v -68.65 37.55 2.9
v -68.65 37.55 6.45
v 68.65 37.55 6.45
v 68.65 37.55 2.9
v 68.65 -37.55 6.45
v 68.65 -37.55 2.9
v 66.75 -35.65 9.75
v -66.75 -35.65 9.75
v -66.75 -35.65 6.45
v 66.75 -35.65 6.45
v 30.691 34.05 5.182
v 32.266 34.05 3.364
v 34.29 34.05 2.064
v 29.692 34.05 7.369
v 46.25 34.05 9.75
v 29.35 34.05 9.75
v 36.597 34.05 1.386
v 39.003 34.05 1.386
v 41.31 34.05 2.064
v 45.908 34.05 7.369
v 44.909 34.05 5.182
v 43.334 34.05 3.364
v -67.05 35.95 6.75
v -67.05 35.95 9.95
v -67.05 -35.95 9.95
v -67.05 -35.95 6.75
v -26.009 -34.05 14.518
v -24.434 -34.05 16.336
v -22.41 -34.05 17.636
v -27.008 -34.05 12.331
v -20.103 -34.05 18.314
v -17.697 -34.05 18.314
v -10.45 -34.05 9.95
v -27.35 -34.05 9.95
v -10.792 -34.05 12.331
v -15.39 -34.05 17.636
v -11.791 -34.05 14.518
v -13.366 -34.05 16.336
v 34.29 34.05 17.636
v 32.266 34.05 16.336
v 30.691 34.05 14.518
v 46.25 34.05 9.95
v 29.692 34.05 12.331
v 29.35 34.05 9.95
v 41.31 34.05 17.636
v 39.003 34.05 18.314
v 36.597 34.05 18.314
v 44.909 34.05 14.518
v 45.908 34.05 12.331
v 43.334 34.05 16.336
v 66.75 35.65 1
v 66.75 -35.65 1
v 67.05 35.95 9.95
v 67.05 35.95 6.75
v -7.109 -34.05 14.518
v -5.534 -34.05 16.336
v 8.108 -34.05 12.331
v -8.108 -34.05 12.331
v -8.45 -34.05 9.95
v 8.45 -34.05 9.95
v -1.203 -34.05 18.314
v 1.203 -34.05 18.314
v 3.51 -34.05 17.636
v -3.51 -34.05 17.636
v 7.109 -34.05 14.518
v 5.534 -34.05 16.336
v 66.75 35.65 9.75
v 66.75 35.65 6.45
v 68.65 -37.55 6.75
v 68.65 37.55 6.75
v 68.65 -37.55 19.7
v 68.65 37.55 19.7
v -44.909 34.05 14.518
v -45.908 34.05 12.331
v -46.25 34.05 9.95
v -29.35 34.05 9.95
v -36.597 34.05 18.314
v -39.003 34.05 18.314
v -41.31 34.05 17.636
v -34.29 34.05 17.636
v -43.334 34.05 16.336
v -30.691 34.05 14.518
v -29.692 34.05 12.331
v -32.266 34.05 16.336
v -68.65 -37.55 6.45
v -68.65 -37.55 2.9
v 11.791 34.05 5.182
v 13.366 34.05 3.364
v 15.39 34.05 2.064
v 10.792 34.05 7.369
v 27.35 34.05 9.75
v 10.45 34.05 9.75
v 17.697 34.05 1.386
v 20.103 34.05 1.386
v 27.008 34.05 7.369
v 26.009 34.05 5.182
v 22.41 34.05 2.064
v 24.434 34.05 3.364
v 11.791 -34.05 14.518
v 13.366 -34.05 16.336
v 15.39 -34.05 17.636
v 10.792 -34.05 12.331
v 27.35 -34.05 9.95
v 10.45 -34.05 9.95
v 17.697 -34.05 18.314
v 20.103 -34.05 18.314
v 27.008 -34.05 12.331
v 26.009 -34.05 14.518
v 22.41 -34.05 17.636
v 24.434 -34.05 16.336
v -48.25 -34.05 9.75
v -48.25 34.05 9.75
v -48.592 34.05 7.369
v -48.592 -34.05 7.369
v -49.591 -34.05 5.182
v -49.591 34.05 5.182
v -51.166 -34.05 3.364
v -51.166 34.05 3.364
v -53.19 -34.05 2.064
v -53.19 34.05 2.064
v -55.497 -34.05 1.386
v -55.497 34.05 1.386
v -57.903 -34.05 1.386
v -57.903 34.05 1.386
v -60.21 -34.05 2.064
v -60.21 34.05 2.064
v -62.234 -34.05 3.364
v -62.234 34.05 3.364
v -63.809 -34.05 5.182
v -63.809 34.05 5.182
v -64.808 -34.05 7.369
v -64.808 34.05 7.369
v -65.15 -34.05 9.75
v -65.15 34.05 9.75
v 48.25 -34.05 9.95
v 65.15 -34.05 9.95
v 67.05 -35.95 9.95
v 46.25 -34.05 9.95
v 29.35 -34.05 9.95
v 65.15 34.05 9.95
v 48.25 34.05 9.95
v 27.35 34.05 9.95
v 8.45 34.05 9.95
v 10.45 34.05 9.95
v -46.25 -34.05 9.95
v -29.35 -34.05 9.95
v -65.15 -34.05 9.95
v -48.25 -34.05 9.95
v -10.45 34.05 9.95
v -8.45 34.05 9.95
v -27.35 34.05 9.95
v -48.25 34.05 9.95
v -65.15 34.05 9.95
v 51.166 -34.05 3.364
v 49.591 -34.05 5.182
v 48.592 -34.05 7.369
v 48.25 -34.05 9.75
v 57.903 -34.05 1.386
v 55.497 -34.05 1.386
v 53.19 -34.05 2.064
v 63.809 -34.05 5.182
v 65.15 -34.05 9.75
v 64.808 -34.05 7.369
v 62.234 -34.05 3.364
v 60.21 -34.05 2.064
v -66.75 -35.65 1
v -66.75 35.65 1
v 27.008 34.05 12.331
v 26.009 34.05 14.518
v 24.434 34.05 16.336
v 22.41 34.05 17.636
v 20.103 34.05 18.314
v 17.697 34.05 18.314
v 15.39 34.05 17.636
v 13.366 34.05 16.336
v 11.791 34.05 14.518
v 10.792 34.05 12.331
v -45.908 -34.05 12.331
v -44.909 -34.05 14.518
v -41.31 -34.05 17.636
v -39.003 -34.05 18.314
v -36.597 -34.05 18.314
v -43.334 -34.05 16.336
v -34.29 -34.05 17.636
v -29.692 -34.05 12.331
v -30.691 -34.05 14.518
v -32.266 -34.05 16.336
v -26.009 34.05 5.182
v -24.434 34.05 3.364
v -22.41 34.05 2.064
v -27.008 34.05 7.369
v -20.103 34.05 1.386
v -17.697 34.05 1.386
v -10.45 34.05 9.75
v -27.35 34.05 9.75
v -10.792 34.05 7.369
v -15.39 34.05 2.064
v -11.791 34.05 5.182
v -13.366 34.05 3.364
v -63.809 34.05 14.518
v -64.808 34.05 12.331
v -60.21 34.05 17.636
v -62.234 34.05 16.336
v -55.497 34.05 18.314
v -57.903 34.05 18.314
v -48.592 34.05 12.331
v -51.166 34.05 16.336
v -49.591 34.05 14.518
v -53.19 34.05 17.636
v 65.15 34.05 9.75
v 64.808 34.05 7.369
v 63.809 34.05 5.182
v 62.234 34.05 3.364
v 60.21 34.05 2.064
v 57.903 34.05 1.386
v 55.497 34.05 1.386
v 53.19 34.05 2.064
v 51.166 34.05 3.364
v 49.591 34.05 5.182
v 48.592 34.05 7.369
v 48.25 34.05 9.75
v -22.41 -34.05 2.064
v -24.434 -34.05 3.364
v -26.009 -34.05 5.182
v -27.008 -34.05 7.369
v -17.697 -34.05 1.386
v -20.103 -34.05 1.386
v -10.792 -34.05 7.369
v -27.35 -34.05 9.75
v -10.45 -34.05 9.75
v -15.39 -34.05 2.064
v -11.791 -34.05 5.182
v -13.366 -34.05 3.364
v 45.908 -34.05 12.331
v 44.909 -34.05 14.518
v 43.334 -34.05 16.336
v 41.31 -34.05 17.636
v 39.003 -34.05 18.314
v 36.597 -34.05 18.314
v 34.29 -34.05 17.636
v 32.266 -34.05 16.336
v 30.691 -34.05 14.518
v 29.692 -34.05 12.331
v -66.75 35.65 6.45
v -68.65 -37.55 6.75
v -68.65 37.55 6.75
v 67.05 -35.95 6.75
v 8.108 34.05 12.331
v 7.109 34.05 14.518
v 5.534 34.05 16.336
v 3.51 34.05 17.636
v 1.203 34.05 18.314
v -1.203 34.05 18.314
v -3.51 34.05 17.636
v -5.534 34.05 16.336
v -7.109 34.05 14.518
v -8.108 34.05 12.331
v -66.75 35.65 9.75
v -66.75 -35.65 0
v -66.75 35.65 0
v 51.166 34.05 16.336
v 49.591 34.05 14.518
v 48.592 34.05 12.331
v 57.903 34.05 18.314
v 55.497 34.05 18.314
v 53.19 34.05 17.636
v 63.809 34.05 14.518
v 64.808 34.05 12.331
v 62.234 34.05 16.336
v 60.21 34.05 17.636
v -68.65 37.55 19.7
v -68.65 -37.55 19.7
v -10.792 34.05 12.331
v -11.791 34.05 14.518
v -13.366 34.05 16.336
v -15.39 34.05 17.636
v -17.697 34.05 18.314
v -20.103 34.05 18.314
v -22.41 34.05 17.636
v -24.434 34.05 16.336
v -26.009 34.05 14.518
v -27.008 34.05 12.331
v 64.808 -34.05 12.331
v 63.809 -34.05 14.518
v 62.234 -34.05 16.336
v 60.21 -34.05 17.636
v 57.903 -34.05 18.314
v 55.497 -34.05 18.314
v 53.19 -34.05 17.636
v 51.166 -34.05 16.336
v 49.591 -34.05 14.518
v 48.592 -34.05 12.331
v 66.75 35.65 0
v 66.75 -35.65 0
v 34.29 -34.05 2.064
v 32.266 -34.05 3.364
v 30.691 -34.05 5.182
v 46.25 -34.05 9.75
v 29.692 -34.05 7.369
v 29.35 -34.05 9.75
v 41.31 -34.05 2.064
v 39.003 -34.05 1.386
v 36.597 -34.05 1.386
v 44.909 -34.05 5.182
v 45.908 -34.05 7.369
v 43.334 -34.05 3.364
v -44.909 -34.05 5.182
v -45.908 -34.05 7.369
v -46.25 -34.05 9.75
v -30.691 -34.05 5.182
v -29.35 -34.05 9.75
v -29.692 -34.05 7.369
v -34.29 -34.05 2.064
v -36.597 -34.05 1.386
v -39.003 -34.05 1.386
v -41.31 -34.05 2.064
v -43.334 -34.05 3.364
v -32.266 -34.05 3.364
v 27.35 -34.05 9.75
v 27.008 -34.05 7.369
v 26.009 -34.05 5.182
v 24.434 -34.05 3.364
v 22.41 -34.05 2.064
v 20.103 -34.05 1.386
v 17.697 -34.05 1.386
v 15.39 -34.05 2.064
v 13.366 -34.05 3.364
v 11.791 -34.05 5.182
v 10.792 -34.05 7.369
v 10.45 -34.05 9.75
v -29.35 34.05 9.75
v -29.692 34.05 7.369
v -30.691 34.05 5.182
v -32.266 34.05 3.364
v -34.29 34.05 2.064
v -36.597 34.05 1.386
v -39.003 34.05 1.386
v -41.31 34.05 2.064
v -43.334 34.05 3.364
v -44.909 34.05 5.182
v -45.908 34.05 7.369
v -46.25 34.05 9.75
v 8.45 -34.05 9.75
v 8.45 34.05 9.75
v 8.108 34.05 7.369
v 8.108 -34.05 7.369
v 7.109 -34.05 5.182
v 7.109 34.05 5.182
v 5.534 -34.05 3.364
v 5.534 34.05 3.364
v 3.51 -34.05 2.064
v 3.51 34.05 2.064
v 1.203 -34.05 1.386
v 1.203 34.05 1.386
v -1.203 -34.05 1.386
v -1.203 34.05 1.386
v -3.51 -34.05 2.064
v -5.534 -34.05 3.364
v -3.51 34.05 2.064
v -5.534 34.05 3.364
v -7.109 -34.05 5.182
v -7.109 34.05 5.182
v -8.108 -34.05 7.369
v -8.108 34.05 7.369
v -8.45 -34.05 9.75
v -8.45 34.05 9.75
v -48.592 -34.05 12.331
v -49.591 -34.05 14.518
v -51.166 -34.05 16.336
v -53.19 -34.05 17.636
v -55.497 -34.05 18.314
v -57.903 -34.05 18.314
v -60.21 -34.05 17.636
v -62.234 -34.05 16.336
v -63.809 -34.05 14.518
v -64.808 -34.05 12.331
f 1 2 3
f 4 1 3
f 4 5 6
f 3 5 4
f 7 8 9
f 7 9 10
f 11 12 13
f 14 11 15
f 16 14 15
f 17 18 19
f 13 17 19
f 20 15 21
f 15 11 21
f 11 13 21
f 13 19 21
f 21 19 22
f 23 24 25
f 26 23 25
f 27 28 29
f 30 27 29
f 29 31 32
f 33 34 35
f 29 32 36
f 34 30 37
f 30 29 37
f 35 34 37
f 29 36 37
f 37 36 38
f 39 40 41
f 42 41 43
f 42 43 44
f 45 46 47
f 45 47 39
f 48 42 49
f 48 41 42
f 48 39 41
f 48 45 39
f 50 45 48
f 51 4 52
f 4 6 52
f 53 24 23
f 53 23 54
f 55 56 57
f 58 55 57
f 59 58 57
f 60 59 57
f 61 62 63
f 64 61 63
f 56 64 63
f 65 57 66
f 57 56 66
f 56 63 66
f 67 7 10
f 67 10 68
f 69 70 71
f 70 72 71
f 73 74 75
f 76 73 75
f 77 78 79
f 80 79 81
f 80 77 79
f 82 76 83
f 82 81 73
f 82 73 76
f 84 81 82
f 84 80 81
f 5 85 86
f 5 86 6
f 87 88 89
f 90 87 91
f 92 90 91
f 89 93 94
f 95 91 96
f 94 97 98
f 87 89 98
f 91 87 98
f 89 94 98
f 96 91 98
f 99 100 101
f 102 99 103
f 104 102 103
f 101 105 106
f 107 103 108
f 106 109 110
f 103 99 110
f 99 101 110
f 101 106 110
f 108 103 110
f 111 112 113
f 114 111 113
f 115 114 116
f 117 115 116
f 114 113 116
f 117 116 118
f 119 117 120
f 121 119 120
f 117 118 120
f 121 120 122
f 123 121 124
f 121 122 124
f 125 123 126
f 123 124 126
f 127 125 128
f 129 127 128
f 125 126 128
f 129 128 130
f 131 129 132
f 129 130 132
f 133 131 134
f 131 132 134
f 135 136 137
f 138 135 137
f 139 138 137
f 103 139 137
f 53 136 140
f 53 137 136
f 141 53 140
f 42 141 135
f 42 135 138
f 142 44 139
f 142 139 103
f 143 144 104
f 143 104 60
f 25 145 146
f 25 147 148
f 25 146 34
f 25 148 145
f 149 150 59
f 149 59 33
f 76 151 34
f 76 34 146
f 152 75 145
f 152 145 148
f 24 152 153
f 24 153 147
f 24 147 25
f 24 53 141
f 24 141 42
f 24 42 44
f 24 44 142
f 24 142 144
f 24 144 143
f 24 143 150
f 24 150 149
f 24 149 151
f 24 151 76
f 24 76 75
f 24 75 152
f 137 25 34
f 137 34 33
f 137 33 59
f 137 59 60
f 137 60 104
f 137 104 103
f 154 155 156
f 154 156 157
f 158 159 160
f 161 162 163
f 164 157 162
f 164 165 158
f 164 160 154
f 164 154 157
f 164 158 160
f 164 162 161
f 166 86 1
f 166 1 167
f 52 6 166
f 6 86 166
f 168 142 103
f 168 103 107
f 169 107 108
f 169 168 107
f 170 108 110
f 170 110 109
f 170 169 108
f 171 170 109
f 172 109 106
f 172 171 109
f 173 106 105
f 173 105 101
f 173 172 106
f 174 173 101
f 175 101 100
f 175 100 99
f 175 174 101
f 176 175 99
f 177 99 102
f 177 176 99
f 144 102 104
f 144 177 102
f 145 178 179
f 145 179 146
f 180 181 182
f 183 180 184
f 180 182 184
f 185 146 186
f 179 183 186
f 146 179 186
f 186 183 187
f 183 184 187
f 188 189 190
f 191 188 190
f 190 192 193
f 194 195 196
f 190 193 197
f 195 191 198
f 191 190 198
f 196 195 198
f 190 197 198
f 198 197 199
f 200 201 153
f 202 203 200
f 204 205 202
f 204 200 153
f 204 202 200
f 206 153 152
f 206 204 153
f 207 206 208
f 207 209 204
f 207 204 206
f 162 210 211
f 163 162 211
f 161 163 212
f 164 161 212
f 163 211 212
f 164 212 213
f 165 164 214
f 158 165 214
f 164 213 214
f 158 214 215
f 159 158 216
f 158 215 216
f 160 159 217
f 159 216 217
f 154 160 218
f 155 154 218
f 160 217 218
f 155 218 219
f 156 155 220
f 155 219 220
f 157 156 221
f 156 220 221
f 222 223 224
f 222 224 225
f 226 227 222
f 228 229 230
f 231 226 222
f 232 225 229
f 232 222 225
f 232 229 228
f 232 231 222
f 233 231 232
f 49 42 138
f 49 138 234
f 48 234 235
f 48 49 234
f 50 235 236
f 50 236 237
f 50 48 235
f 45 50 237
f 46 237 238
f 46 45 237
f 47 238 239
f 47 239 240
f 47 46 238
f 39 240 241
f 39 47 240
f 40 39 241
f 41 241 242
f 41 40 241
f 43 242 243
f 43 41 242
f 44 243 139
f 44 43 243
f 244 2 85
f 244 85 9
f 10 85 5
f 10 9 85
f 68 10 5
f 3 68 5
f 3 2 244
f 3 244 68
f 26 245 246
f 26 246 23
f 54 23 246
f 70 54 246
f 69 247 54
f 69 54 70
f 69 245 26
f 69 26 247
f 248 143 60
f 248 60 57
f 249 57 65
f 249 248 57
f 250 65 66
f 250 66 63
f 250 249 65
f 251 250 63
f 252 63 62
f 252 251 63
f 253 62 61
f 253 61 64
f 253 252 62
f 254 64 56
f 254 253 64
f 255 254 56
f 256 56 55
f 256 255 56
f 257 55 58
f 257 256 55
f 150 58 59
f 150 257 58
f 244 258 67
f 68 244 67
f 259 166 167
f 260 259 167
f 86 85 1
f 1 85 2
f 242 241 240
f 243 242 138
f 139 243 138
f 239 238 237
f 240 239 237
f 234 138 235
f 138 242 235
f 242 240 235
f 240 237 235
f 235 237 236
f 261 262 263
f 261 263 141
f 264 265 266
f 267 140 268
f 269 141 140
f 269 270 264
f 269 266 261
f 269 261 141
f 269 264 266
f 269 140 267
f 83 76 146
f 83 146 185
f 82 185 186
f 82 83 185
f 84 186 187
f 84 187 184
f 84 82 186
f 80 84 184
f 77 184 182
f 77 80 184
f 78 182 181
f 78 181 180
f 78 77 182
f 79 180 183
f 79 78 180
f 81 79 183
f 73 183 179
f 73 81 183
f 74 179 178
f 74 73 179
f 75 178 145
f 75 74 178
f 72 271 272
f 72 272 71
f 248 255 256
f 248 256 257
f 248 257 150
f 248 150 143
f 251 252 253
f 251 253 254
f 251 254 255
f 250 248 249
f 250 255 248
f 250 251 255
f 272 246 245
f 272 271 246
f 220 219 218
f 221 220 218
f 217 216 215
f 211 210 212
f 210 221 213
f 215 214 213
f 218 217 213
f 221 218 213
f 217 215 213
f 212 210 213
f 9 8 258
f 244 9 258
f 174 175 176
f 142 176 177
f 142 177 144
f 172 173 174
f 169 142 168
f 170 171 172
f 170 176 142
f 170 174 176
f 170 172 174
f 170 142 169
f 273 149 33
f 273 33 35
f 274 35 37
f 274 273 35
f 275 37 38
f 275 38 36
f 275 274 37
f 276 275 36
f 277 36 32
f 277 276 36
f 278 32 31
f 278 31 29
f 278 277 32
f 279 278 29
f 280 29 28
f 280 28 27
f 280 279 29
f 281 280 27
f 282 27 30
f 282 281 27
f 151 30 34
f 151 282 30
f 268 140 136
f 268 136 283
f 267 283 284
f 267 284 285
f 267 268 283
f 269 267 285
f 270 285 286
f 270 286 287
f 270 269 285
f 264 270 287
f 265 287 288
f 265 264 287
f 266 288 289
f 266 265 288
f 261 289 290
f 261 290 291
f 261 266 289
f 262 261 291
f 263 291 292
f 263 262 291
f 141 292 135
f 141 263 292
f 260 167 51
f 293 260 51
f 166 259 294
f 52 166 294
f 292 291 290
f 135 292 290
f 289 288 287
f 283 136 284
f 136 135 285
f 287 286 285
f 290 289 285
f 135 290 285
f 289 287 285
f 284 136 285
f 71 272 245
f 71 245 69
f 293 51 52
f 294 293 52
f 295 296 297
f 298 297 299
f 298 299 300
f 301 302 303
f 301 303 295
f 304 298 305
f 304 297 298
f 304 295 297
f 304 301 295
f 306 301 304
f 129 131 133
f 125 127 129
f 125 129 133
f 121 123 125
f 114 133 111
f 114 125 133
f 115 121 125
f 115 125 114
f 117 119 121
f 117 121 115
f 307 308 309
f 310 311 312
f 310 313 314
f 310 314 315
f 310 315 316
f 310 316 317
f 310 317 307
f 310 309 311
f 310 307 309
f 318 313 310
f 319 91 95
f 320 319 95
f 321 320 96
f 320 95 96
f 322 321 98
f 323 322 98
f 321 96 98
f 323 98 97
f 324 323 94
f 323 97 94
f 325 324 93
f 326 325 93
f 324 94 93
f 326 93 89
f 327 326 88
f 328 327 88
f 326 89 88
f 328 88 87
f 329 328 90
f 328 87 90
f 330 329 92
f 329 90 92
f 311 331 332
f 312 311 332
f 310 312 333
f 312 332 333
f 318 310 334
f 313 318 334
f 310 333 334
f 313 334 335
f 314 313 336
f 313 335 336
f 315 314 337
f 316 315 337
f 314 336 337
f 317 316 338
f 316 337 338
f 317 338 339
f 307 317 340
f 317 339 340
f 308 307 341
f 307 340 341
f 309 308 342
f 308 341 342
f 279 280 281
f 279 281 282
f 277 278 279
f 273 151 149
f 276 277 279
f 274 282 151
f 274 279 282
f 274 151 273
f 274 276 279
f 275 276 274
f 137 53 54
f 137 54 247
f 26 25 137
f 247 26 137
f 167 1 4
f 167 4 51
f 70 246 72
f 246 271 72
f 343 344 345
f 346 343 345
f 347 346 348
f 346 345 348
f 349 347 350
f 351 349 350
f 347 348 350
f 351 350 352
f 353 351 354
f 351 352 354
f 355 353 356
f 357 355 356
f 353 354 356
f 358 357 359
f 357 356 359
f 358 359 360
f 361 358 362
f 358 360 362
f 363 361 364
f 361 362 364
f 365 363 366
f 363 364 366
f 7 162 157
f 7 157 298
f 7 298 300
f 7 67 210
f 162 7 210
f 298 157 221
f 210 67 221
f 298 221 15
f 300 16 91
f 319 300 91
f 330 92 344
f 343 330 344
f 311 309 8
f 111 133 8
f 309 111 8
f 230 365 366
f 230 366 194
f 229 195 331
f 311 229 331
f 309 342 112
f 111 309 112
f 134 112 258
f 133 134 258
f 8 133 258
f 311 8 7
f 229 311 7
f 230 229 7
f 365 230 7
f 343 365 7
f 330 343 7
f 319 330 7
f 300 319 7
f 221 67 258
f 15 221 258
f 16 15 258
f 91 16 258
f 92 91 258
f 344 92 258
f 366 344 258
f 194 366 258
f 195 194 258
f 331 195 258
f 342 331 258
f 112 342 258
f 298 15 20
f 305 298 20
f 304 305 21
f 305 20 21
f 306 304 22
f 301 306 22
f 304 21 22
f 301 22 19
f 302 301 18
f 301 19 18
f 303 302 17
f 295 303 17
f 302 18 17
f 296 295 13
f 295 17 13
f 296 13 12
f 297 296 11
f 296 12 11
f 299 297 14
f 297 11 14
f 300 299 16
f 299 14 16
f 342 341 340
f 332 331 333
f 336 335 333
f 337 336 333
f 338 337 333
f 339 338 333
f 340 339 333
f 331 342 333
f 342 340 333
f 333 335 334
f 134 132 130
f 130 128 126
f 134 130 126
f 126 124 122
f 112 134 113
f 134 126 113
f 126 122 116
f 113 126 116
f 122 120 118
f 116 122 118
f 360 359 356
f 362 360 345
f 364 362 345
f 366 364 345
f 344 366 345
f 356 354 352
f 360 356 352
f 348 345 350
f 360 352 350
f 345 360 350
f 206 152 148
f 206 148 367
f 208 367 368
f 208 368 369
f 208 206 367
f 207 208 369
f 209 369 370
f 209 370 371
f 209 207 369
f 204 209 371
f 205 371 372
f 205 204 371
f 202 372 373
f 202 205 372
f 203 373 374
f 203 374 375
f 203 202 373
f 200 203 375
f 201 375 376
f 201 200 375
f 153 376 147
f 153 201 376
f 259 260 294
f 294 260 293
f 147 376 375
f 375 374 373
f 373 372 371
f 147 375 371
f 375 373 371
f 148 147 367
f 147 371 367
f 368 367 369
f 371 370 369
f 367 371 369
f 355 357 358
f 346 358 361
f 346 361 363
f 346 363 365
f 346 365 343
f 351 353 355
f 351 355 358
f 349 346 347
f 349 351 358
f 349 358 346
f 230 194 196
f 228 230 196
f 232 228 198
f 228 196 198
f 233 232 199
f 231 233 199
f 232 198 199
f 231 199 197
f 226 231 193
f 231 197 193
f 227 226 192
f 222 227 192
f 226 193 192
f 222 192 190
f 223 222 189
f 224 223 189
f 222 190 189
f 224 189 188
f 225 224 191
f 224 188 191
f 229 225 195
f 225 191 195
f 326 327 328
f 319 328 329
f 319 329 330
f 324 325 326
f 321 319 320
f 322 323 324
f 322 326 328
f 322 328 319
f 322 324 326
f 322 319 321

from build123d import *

# Parameters (mm, degrees)
F4_W          = 137.3
F4_H          = 75.1
F5_DEPTH      = 1
F6_W          = 137.3
F6_H          = 75.1
F6_W_2        = 130.3
F6_H_2        = 68.1
F7_DEPTH      = 8.75
F9_DEPTH      = 68.1
F12_W         = 137.3
F12_H         = 75.1
F12_W_2       = 133.5
F12_H_2       = 71.3
F13_DEPTH     = 3.3
F14_W         = 137.3
F14_H         = 75.1
F14_W_2       = 133.5
F14_H_2       = 71.3
F15_DEPTH     = 3
F16_T4_DEPTH  = 133.5
F16_T9_DEPTH  = 71.3
F16_T14_DEPTH = 133.5
F16_T19_DEPTH = 71.3
F16_T25_DEPTH = 138.6433659759
F16_T31_DEPTH = 76.4433659759
F16_T40_DEPTH = 138.6433659759
F16_T46_DEPTH = 76.4433659759
F16_T55_DEPTH = 138.6433659759
F16_T61_DEPTH = 76.4433659759
F16_T70_DEPTH = 76.4433659759
F16_T76_DEPTH = 138.6433659759
F17_W         = 137.3
F17_H         = 75.1
F17_W_2       = 134.1
F17_H_2       = 71.9
F18_DEPTH     = 3.2


# Not quite as in the source:
# - a fillet or chamfer that OpenCascade refuses, or shapes differently, is made with other operations: its cross-section is extruded or revolved along the edge and cut away or added


with BuildPart() as f5:
    # F4 (on Top) → F5 (new body)
    with BuildSketch(Plane.XY):
        Rectangle(F4_W, F4_H)
    extrude(amount=F5_DEPTH)

    # F6 (on face) → F7 (join)
    with BuildSketch(Plane.XY.offset(1)):
        Rectangle(F6_W, F6_H)
        Rectangle(F6_W_2, F6_H_2, mode=Mode.SUBTRACT)
    extrude(amount=F7_DEPTH)

    # F8 (on face) → F9 (join, through all)
    with BuildSketch(Plane.XZ.offset(-34.05)):
        with BuildLine():
            ThreePointArc((-48.25, 9.75), (-56.7, 1.3), (-65.15, 9.75))
            Line((-65.15, 9.75), (-65.15, 1))
            Line((-65.15, 1), (65.15, 1))
            Line((65.15, 1), (65.15, 9.75))
            ThreePointArc((65.15, 9.75), (56.7, 1.3), (48.25, 9.75))
            Line((48.25, 9.75), (46.25, 9.75))
            ThreePointArc((46.25, 9.75), (37.8, 1.3), (29.35, 9.75))
            Line((29.35, 9.75), (27.35, 9.75))
            ThreePointArc((27.35, 9.75), (18.9, 1.3), (10.45, 9.75))
            Line((10.45, 9.75), (8.45, 9.75))
            ThreePointArc((8.45, 9.75), (0, 1.3), (-8.45, 9.75))
            Line((-8.45, 9.75), (-10.45, 9.75))
            ThreePointArc((-10.45, 9.75), (-18.9, 1.3), (-27.35, 9.75))
            Line((-27.35, 9.75), (-29.35, 9.75))
            ThreePointArc((-29.35, 9.75), (-37.8, 1.3), (-46.25, 9.75))
            Line((-46.25, 9.75), (-48.25, 9.75))
        make_face()
    extrude(amount=F9_DEPTH)


with BuildPart() as f11_1:
    # F11: instance of F5
    add(f5.part.mirror(Plane.XY.offset(9.85)))

    # F17 (on face) → F18 (join)
    with BuildSketch(Plane(origin=(0, 0, 9.95), x_dir=(1, 0, 0), z_dir=(0, 0, -1))):
        Rectangle(F17_W, F17_H)
        Rectangle(F17_W_2, F17_H_2, mode=Mode.SUBTRACT)
    extrude(amount=F18_DEPTH)


with BuildPart() as f5_1:
    add(f5.part)

    # F12 (on face) → F13 (cut)
    with BuildSketch(Plane.XY.offset(9.75)):
        Rectangle(F12_W, F12_H)
        Rectangle(F12_W_2, F12_H_2, mode=Mode.SUBTRACT)
    extrude(amount=-F13_DEPTH, mode=Mode.SUBTRACT)

    # F14 (on face) → F15 (cut)
    with BuildSketch(Plane(origin=(0, 0, 0), x_dir=(1, 0, 0), z_dir=(0, 0, -1))):
        Rectangle(F14_W, F14_H)
        Rectangle(F14_W_2, F14_H_2, mode=Mode.SUBTRACT)
    extrude(amount=-F15_DEPTH, mode=Mode.SUBTRACT)

    # F16: chamfer of 2 on 4 edges, made by hand


with BuildPart() as f16_tool2:
    # F16_s3 → F16_t4 (new body)
    with BuildSketch(Plane.YZ.offset(-66.75)):
        Polygon((-37.65, 3), (-35.65, 1), (-35.65, 3), align=None)
    extrude(amount=F16_T4_DEPTH)

    split(bisect_by=Plane.XZ.offset(37.55), keep=Keep.BOTTOM)


with BuildPart() as f5_2:
    add(f5_1.part)

    # F16_t1: union F16_tool2
    add(f16_tool2.part)


with BuildPart() as f16_tool7:
    # F16_s8 → F16_t9 (new body)
    with BuildSketch(Plane.XZ.offset(-35.65)):
        Polygon((-68.75, 3), (-66.75, 1), (-66.75, 3), align=None)
    extrude(amount=F16_T9_DEPTH)

    split(bisect_by=Plane.YZ.offset(-68.65), keep=Keep.TOP)


with BuildPart() as f5_3:
    add(f5_2.part)

    # F16_t6: union F16_tool7
    add(f16_tool7.part)


with BuildPart() as f16_tool12:
    # F16_s13 → F16_t14 (new body)
    with BuildSketch(Plane.YZ.offset(66.75)):
        Polygon((37.65, 3), (35.65, 1), (35.65, 3), align=None)
    extrude(amount=-F16_T14_DEPTH)

    split(bisect_by=Plane.XZ.offset(-37.55), keep=Keep.TOP)


with BuildPart() as f5_4:
    add(f5_3.part)

    # F16_t11: union F16_tool12
    add(f16_tool12.part)


with BuildPart() as f16_tool17:
    # F16_s18 → F16_t19 (new body)
    with BuildSketch(Plane.XZ.offset(35.65)):
        Polygon((68.75, 3), (66.75, 1), (66.75, 3), align=None)
    extrude(amount=-F16_T19_DEPTH)

    split(bisect_by=Plane.YZ.offset(68.65), keep=Keep.BOTTOM)


with BuildPart() as f5_5:
    add(f5_4.part)

    # F16_t16: union F16_tool17
    add(f16_tool17.part)


with BuildPart() as f16_tool23:
    # F16_s24 → F16_t25 (new body)
    with BuildSketch(Plane.YZ.offset(-71.8933659759)):
        Polygon((-37.65, 3), (-35.65, 1), (-35.65, 3), align=None)
    extrude(amount=F16_T25_DEPTH)

    split(bisect_by=Plane.XZ.offset(37.55), keep=Keep.BOTTOM)

    split(bisect_by=Plane.YZ.offset(-68.65), keep=Keep.TOP)

    split(bisect_by=Plane.YZ.offset(-66.75), keep=Keep.BOTTOM)


with BuildPart() as f16_tool29:
    # F16_s30 → F16_t31 (new body)
    with BuildSketch(Plane.XZ.offset(-35.65)):
        Polygon((-68.75, 3), (-66.75, 1), (-66.75, 3), align=None)
    extrude(amount=F16_T31_DEPTH)

    split(bisect_by=Plane.XZ.offset(37.55), keep=Keep.BOTTOM)

    split(bisect_by=Plane.YZ.offset(-68.65), keep=Keep.TOP)

    split(bisect_by=Plane.XZ.offset(35.65), keep=Keep.TOP)


with BuildPart() as f16_tool23_1:
    add(f16_tool23.part)

    # F16_t35: intersect F16_tool29
    add(f16_tool29.part, mode=Mode.INTERSECT)


with BuildPart() as f5_6:
    add(f5_5.part)

    # F16_t21: union F16_tool23
    add(f16_tool23_1.part)


with BuildPart() as f16_tool38:
    # F16_s39 → F16_t40 (new body)
    with BuildSketch(Plane.YZ.offset(-66.75)):
        Polygon((-37.65, 3), (-35.65, 1), (-35.65, 3), align=None)
    extrude(amount=F16_T40_DEPTH)

    split(bisect_by=Plane.XZ.offset(37.55), keep=Keep.BOTTOM)

    split(bisect_by=Plane.YZ.offset(68.65), keep=Keep.BOTTOM)

    split(bisect_by=Plane.YZ.offset(66.75), keep=Keep.TOP)


with BuildPart() as f16_tool44:
    # F16_s45 → F16_t46 (new body)
    with BuildSketch(Plane.XZ.offset(40.7933659759)):
        Polygon((68.75, 3), (66.75, 1), (66.75, 3), align=None)
    extrude(amount=-F16_T46_DEPTH)

    split(bisect_by=Plane.XZ.offset(37.55), keep=Keep.BOTTOM)

    split(bisect_by=Plane.YZ.offset(68.65), keep=Keep.BOTTOM)

    split(bisect_by=Plane.XZ.offset(35.65), keep=Keep.TOP)


with BuildPart() as f16_tool38_1:
    add(f16_tool38.part)

    # F16_t50: intersect F16_tool44
    add(f16_tool44.part, mode=Mode.INTERSECT)


with BuildPart() as f5_7:
    add(f5_6.part)

    # F16_t36: union F16_tool38
    add(f16_tool38_1.part)


with BuildPart() as f16_tool53:
    # F16_s54 → F16_t55 (new body)
    with BuildSketch(Plane.YZ.offset(66.75)):
        Polygon((37.65, 3), (35.65, 1), (35.65, 3), align=None)
    extrude(amount=-F16_T55_DEPTH)

    split(bisect_by=Plane.YZ.offset(-68.65), keep=Keep.TOP)

    split(bisect_by=Plane.XZ.offset(-37.55), keep=Keep.TOP)

    split(bisect_by=Plane.YZ.offset(-66.75), keep=Keep.BOTTOM)


with BuildPart() as f16_tool59:
    # F16_s60 → F16_t61 (new body)
    with BuildSketch(Plane.XZ.offset(-40.7933659759)):
        Polygon((-68.75, 3), (-66.75, 1), (-66.75, 3), align=None)
    extrude(amount=F16_T61_DEPTH)

    split(bisect_by=Plane.YZ.offset(-68.65), keep=Keep.TOP)

    split(bisect_by=Plane.XZ.offset(-37.55), keep=Keep.TOP)

    split(bisect_by=Plane.XZ.offset(-35.65), keep=Keep.BOTTOM)


with BuildPart() as f16_tool53_1:
    add(f16_tool53.part)

    # F16_t65: intersect F16_tool59
    add(f16_tool59.part, mode=Mode.INTERSECT)


with BuildPart() as f5_8:
    add(f5_7.part)

    # F16_t51: union F16_tool53
    add(f16_tool53_1.part)


with BuildPart() as f16_tool68:
    # F16_s69 → F16_t70 (new body)
    with BuildSketch(Plane.XZ.offset(35.65)):
        Polygon((68.75, 3), (66.75, 1), (66.75, 3), align=None)
    extrude(amount=-F16_T70_DEPTH)

    split(bisect_by=Plane.YZ.offset(68.65), keep=Keep.BOTTOM)

    split(bisect_by=Plane.XZ.offset(-37.55), keep=Keep.TOP)

    split(bisect_by=Plane.XZ.offset(-35.65), keep=Keep.BOTTOM)


with BuildPart() as f16_tool74:
    # F16_s75 → F16_t76 (new body)
    with BuildSketch(Plane.YZ.offset(71.8933659759)):
        Polygon((37.65, 3), (35.65, 1), (35.65, 3), align=None)
    extrude(amount=-F16_T76_DEPTH)

    split(bisect_by=Plane.YZ.offset(68.65), keep=Keep.BOTTOM)

    split(bisect_by=Plane.XZ.offset(-37.55), keep=Keep.TOP)

    split(bisect_by=Plane.YZ.offset(66.75), keep=Keep.TOP)


with BuildPart() as f16_tool68_1:
    add(f16_tool68.part)

    # F16_t80: intersect F16_tool74
    add(f16_tool74.part, mode=Mode.INTERSECT)


with BuildPart() as f5_9:
    add(f5_8.part)

    # F16_t66: union F16_tool68
    add(f16_tool68_1.part)


solid = Compound([f11_1.part, f5_9.part])
